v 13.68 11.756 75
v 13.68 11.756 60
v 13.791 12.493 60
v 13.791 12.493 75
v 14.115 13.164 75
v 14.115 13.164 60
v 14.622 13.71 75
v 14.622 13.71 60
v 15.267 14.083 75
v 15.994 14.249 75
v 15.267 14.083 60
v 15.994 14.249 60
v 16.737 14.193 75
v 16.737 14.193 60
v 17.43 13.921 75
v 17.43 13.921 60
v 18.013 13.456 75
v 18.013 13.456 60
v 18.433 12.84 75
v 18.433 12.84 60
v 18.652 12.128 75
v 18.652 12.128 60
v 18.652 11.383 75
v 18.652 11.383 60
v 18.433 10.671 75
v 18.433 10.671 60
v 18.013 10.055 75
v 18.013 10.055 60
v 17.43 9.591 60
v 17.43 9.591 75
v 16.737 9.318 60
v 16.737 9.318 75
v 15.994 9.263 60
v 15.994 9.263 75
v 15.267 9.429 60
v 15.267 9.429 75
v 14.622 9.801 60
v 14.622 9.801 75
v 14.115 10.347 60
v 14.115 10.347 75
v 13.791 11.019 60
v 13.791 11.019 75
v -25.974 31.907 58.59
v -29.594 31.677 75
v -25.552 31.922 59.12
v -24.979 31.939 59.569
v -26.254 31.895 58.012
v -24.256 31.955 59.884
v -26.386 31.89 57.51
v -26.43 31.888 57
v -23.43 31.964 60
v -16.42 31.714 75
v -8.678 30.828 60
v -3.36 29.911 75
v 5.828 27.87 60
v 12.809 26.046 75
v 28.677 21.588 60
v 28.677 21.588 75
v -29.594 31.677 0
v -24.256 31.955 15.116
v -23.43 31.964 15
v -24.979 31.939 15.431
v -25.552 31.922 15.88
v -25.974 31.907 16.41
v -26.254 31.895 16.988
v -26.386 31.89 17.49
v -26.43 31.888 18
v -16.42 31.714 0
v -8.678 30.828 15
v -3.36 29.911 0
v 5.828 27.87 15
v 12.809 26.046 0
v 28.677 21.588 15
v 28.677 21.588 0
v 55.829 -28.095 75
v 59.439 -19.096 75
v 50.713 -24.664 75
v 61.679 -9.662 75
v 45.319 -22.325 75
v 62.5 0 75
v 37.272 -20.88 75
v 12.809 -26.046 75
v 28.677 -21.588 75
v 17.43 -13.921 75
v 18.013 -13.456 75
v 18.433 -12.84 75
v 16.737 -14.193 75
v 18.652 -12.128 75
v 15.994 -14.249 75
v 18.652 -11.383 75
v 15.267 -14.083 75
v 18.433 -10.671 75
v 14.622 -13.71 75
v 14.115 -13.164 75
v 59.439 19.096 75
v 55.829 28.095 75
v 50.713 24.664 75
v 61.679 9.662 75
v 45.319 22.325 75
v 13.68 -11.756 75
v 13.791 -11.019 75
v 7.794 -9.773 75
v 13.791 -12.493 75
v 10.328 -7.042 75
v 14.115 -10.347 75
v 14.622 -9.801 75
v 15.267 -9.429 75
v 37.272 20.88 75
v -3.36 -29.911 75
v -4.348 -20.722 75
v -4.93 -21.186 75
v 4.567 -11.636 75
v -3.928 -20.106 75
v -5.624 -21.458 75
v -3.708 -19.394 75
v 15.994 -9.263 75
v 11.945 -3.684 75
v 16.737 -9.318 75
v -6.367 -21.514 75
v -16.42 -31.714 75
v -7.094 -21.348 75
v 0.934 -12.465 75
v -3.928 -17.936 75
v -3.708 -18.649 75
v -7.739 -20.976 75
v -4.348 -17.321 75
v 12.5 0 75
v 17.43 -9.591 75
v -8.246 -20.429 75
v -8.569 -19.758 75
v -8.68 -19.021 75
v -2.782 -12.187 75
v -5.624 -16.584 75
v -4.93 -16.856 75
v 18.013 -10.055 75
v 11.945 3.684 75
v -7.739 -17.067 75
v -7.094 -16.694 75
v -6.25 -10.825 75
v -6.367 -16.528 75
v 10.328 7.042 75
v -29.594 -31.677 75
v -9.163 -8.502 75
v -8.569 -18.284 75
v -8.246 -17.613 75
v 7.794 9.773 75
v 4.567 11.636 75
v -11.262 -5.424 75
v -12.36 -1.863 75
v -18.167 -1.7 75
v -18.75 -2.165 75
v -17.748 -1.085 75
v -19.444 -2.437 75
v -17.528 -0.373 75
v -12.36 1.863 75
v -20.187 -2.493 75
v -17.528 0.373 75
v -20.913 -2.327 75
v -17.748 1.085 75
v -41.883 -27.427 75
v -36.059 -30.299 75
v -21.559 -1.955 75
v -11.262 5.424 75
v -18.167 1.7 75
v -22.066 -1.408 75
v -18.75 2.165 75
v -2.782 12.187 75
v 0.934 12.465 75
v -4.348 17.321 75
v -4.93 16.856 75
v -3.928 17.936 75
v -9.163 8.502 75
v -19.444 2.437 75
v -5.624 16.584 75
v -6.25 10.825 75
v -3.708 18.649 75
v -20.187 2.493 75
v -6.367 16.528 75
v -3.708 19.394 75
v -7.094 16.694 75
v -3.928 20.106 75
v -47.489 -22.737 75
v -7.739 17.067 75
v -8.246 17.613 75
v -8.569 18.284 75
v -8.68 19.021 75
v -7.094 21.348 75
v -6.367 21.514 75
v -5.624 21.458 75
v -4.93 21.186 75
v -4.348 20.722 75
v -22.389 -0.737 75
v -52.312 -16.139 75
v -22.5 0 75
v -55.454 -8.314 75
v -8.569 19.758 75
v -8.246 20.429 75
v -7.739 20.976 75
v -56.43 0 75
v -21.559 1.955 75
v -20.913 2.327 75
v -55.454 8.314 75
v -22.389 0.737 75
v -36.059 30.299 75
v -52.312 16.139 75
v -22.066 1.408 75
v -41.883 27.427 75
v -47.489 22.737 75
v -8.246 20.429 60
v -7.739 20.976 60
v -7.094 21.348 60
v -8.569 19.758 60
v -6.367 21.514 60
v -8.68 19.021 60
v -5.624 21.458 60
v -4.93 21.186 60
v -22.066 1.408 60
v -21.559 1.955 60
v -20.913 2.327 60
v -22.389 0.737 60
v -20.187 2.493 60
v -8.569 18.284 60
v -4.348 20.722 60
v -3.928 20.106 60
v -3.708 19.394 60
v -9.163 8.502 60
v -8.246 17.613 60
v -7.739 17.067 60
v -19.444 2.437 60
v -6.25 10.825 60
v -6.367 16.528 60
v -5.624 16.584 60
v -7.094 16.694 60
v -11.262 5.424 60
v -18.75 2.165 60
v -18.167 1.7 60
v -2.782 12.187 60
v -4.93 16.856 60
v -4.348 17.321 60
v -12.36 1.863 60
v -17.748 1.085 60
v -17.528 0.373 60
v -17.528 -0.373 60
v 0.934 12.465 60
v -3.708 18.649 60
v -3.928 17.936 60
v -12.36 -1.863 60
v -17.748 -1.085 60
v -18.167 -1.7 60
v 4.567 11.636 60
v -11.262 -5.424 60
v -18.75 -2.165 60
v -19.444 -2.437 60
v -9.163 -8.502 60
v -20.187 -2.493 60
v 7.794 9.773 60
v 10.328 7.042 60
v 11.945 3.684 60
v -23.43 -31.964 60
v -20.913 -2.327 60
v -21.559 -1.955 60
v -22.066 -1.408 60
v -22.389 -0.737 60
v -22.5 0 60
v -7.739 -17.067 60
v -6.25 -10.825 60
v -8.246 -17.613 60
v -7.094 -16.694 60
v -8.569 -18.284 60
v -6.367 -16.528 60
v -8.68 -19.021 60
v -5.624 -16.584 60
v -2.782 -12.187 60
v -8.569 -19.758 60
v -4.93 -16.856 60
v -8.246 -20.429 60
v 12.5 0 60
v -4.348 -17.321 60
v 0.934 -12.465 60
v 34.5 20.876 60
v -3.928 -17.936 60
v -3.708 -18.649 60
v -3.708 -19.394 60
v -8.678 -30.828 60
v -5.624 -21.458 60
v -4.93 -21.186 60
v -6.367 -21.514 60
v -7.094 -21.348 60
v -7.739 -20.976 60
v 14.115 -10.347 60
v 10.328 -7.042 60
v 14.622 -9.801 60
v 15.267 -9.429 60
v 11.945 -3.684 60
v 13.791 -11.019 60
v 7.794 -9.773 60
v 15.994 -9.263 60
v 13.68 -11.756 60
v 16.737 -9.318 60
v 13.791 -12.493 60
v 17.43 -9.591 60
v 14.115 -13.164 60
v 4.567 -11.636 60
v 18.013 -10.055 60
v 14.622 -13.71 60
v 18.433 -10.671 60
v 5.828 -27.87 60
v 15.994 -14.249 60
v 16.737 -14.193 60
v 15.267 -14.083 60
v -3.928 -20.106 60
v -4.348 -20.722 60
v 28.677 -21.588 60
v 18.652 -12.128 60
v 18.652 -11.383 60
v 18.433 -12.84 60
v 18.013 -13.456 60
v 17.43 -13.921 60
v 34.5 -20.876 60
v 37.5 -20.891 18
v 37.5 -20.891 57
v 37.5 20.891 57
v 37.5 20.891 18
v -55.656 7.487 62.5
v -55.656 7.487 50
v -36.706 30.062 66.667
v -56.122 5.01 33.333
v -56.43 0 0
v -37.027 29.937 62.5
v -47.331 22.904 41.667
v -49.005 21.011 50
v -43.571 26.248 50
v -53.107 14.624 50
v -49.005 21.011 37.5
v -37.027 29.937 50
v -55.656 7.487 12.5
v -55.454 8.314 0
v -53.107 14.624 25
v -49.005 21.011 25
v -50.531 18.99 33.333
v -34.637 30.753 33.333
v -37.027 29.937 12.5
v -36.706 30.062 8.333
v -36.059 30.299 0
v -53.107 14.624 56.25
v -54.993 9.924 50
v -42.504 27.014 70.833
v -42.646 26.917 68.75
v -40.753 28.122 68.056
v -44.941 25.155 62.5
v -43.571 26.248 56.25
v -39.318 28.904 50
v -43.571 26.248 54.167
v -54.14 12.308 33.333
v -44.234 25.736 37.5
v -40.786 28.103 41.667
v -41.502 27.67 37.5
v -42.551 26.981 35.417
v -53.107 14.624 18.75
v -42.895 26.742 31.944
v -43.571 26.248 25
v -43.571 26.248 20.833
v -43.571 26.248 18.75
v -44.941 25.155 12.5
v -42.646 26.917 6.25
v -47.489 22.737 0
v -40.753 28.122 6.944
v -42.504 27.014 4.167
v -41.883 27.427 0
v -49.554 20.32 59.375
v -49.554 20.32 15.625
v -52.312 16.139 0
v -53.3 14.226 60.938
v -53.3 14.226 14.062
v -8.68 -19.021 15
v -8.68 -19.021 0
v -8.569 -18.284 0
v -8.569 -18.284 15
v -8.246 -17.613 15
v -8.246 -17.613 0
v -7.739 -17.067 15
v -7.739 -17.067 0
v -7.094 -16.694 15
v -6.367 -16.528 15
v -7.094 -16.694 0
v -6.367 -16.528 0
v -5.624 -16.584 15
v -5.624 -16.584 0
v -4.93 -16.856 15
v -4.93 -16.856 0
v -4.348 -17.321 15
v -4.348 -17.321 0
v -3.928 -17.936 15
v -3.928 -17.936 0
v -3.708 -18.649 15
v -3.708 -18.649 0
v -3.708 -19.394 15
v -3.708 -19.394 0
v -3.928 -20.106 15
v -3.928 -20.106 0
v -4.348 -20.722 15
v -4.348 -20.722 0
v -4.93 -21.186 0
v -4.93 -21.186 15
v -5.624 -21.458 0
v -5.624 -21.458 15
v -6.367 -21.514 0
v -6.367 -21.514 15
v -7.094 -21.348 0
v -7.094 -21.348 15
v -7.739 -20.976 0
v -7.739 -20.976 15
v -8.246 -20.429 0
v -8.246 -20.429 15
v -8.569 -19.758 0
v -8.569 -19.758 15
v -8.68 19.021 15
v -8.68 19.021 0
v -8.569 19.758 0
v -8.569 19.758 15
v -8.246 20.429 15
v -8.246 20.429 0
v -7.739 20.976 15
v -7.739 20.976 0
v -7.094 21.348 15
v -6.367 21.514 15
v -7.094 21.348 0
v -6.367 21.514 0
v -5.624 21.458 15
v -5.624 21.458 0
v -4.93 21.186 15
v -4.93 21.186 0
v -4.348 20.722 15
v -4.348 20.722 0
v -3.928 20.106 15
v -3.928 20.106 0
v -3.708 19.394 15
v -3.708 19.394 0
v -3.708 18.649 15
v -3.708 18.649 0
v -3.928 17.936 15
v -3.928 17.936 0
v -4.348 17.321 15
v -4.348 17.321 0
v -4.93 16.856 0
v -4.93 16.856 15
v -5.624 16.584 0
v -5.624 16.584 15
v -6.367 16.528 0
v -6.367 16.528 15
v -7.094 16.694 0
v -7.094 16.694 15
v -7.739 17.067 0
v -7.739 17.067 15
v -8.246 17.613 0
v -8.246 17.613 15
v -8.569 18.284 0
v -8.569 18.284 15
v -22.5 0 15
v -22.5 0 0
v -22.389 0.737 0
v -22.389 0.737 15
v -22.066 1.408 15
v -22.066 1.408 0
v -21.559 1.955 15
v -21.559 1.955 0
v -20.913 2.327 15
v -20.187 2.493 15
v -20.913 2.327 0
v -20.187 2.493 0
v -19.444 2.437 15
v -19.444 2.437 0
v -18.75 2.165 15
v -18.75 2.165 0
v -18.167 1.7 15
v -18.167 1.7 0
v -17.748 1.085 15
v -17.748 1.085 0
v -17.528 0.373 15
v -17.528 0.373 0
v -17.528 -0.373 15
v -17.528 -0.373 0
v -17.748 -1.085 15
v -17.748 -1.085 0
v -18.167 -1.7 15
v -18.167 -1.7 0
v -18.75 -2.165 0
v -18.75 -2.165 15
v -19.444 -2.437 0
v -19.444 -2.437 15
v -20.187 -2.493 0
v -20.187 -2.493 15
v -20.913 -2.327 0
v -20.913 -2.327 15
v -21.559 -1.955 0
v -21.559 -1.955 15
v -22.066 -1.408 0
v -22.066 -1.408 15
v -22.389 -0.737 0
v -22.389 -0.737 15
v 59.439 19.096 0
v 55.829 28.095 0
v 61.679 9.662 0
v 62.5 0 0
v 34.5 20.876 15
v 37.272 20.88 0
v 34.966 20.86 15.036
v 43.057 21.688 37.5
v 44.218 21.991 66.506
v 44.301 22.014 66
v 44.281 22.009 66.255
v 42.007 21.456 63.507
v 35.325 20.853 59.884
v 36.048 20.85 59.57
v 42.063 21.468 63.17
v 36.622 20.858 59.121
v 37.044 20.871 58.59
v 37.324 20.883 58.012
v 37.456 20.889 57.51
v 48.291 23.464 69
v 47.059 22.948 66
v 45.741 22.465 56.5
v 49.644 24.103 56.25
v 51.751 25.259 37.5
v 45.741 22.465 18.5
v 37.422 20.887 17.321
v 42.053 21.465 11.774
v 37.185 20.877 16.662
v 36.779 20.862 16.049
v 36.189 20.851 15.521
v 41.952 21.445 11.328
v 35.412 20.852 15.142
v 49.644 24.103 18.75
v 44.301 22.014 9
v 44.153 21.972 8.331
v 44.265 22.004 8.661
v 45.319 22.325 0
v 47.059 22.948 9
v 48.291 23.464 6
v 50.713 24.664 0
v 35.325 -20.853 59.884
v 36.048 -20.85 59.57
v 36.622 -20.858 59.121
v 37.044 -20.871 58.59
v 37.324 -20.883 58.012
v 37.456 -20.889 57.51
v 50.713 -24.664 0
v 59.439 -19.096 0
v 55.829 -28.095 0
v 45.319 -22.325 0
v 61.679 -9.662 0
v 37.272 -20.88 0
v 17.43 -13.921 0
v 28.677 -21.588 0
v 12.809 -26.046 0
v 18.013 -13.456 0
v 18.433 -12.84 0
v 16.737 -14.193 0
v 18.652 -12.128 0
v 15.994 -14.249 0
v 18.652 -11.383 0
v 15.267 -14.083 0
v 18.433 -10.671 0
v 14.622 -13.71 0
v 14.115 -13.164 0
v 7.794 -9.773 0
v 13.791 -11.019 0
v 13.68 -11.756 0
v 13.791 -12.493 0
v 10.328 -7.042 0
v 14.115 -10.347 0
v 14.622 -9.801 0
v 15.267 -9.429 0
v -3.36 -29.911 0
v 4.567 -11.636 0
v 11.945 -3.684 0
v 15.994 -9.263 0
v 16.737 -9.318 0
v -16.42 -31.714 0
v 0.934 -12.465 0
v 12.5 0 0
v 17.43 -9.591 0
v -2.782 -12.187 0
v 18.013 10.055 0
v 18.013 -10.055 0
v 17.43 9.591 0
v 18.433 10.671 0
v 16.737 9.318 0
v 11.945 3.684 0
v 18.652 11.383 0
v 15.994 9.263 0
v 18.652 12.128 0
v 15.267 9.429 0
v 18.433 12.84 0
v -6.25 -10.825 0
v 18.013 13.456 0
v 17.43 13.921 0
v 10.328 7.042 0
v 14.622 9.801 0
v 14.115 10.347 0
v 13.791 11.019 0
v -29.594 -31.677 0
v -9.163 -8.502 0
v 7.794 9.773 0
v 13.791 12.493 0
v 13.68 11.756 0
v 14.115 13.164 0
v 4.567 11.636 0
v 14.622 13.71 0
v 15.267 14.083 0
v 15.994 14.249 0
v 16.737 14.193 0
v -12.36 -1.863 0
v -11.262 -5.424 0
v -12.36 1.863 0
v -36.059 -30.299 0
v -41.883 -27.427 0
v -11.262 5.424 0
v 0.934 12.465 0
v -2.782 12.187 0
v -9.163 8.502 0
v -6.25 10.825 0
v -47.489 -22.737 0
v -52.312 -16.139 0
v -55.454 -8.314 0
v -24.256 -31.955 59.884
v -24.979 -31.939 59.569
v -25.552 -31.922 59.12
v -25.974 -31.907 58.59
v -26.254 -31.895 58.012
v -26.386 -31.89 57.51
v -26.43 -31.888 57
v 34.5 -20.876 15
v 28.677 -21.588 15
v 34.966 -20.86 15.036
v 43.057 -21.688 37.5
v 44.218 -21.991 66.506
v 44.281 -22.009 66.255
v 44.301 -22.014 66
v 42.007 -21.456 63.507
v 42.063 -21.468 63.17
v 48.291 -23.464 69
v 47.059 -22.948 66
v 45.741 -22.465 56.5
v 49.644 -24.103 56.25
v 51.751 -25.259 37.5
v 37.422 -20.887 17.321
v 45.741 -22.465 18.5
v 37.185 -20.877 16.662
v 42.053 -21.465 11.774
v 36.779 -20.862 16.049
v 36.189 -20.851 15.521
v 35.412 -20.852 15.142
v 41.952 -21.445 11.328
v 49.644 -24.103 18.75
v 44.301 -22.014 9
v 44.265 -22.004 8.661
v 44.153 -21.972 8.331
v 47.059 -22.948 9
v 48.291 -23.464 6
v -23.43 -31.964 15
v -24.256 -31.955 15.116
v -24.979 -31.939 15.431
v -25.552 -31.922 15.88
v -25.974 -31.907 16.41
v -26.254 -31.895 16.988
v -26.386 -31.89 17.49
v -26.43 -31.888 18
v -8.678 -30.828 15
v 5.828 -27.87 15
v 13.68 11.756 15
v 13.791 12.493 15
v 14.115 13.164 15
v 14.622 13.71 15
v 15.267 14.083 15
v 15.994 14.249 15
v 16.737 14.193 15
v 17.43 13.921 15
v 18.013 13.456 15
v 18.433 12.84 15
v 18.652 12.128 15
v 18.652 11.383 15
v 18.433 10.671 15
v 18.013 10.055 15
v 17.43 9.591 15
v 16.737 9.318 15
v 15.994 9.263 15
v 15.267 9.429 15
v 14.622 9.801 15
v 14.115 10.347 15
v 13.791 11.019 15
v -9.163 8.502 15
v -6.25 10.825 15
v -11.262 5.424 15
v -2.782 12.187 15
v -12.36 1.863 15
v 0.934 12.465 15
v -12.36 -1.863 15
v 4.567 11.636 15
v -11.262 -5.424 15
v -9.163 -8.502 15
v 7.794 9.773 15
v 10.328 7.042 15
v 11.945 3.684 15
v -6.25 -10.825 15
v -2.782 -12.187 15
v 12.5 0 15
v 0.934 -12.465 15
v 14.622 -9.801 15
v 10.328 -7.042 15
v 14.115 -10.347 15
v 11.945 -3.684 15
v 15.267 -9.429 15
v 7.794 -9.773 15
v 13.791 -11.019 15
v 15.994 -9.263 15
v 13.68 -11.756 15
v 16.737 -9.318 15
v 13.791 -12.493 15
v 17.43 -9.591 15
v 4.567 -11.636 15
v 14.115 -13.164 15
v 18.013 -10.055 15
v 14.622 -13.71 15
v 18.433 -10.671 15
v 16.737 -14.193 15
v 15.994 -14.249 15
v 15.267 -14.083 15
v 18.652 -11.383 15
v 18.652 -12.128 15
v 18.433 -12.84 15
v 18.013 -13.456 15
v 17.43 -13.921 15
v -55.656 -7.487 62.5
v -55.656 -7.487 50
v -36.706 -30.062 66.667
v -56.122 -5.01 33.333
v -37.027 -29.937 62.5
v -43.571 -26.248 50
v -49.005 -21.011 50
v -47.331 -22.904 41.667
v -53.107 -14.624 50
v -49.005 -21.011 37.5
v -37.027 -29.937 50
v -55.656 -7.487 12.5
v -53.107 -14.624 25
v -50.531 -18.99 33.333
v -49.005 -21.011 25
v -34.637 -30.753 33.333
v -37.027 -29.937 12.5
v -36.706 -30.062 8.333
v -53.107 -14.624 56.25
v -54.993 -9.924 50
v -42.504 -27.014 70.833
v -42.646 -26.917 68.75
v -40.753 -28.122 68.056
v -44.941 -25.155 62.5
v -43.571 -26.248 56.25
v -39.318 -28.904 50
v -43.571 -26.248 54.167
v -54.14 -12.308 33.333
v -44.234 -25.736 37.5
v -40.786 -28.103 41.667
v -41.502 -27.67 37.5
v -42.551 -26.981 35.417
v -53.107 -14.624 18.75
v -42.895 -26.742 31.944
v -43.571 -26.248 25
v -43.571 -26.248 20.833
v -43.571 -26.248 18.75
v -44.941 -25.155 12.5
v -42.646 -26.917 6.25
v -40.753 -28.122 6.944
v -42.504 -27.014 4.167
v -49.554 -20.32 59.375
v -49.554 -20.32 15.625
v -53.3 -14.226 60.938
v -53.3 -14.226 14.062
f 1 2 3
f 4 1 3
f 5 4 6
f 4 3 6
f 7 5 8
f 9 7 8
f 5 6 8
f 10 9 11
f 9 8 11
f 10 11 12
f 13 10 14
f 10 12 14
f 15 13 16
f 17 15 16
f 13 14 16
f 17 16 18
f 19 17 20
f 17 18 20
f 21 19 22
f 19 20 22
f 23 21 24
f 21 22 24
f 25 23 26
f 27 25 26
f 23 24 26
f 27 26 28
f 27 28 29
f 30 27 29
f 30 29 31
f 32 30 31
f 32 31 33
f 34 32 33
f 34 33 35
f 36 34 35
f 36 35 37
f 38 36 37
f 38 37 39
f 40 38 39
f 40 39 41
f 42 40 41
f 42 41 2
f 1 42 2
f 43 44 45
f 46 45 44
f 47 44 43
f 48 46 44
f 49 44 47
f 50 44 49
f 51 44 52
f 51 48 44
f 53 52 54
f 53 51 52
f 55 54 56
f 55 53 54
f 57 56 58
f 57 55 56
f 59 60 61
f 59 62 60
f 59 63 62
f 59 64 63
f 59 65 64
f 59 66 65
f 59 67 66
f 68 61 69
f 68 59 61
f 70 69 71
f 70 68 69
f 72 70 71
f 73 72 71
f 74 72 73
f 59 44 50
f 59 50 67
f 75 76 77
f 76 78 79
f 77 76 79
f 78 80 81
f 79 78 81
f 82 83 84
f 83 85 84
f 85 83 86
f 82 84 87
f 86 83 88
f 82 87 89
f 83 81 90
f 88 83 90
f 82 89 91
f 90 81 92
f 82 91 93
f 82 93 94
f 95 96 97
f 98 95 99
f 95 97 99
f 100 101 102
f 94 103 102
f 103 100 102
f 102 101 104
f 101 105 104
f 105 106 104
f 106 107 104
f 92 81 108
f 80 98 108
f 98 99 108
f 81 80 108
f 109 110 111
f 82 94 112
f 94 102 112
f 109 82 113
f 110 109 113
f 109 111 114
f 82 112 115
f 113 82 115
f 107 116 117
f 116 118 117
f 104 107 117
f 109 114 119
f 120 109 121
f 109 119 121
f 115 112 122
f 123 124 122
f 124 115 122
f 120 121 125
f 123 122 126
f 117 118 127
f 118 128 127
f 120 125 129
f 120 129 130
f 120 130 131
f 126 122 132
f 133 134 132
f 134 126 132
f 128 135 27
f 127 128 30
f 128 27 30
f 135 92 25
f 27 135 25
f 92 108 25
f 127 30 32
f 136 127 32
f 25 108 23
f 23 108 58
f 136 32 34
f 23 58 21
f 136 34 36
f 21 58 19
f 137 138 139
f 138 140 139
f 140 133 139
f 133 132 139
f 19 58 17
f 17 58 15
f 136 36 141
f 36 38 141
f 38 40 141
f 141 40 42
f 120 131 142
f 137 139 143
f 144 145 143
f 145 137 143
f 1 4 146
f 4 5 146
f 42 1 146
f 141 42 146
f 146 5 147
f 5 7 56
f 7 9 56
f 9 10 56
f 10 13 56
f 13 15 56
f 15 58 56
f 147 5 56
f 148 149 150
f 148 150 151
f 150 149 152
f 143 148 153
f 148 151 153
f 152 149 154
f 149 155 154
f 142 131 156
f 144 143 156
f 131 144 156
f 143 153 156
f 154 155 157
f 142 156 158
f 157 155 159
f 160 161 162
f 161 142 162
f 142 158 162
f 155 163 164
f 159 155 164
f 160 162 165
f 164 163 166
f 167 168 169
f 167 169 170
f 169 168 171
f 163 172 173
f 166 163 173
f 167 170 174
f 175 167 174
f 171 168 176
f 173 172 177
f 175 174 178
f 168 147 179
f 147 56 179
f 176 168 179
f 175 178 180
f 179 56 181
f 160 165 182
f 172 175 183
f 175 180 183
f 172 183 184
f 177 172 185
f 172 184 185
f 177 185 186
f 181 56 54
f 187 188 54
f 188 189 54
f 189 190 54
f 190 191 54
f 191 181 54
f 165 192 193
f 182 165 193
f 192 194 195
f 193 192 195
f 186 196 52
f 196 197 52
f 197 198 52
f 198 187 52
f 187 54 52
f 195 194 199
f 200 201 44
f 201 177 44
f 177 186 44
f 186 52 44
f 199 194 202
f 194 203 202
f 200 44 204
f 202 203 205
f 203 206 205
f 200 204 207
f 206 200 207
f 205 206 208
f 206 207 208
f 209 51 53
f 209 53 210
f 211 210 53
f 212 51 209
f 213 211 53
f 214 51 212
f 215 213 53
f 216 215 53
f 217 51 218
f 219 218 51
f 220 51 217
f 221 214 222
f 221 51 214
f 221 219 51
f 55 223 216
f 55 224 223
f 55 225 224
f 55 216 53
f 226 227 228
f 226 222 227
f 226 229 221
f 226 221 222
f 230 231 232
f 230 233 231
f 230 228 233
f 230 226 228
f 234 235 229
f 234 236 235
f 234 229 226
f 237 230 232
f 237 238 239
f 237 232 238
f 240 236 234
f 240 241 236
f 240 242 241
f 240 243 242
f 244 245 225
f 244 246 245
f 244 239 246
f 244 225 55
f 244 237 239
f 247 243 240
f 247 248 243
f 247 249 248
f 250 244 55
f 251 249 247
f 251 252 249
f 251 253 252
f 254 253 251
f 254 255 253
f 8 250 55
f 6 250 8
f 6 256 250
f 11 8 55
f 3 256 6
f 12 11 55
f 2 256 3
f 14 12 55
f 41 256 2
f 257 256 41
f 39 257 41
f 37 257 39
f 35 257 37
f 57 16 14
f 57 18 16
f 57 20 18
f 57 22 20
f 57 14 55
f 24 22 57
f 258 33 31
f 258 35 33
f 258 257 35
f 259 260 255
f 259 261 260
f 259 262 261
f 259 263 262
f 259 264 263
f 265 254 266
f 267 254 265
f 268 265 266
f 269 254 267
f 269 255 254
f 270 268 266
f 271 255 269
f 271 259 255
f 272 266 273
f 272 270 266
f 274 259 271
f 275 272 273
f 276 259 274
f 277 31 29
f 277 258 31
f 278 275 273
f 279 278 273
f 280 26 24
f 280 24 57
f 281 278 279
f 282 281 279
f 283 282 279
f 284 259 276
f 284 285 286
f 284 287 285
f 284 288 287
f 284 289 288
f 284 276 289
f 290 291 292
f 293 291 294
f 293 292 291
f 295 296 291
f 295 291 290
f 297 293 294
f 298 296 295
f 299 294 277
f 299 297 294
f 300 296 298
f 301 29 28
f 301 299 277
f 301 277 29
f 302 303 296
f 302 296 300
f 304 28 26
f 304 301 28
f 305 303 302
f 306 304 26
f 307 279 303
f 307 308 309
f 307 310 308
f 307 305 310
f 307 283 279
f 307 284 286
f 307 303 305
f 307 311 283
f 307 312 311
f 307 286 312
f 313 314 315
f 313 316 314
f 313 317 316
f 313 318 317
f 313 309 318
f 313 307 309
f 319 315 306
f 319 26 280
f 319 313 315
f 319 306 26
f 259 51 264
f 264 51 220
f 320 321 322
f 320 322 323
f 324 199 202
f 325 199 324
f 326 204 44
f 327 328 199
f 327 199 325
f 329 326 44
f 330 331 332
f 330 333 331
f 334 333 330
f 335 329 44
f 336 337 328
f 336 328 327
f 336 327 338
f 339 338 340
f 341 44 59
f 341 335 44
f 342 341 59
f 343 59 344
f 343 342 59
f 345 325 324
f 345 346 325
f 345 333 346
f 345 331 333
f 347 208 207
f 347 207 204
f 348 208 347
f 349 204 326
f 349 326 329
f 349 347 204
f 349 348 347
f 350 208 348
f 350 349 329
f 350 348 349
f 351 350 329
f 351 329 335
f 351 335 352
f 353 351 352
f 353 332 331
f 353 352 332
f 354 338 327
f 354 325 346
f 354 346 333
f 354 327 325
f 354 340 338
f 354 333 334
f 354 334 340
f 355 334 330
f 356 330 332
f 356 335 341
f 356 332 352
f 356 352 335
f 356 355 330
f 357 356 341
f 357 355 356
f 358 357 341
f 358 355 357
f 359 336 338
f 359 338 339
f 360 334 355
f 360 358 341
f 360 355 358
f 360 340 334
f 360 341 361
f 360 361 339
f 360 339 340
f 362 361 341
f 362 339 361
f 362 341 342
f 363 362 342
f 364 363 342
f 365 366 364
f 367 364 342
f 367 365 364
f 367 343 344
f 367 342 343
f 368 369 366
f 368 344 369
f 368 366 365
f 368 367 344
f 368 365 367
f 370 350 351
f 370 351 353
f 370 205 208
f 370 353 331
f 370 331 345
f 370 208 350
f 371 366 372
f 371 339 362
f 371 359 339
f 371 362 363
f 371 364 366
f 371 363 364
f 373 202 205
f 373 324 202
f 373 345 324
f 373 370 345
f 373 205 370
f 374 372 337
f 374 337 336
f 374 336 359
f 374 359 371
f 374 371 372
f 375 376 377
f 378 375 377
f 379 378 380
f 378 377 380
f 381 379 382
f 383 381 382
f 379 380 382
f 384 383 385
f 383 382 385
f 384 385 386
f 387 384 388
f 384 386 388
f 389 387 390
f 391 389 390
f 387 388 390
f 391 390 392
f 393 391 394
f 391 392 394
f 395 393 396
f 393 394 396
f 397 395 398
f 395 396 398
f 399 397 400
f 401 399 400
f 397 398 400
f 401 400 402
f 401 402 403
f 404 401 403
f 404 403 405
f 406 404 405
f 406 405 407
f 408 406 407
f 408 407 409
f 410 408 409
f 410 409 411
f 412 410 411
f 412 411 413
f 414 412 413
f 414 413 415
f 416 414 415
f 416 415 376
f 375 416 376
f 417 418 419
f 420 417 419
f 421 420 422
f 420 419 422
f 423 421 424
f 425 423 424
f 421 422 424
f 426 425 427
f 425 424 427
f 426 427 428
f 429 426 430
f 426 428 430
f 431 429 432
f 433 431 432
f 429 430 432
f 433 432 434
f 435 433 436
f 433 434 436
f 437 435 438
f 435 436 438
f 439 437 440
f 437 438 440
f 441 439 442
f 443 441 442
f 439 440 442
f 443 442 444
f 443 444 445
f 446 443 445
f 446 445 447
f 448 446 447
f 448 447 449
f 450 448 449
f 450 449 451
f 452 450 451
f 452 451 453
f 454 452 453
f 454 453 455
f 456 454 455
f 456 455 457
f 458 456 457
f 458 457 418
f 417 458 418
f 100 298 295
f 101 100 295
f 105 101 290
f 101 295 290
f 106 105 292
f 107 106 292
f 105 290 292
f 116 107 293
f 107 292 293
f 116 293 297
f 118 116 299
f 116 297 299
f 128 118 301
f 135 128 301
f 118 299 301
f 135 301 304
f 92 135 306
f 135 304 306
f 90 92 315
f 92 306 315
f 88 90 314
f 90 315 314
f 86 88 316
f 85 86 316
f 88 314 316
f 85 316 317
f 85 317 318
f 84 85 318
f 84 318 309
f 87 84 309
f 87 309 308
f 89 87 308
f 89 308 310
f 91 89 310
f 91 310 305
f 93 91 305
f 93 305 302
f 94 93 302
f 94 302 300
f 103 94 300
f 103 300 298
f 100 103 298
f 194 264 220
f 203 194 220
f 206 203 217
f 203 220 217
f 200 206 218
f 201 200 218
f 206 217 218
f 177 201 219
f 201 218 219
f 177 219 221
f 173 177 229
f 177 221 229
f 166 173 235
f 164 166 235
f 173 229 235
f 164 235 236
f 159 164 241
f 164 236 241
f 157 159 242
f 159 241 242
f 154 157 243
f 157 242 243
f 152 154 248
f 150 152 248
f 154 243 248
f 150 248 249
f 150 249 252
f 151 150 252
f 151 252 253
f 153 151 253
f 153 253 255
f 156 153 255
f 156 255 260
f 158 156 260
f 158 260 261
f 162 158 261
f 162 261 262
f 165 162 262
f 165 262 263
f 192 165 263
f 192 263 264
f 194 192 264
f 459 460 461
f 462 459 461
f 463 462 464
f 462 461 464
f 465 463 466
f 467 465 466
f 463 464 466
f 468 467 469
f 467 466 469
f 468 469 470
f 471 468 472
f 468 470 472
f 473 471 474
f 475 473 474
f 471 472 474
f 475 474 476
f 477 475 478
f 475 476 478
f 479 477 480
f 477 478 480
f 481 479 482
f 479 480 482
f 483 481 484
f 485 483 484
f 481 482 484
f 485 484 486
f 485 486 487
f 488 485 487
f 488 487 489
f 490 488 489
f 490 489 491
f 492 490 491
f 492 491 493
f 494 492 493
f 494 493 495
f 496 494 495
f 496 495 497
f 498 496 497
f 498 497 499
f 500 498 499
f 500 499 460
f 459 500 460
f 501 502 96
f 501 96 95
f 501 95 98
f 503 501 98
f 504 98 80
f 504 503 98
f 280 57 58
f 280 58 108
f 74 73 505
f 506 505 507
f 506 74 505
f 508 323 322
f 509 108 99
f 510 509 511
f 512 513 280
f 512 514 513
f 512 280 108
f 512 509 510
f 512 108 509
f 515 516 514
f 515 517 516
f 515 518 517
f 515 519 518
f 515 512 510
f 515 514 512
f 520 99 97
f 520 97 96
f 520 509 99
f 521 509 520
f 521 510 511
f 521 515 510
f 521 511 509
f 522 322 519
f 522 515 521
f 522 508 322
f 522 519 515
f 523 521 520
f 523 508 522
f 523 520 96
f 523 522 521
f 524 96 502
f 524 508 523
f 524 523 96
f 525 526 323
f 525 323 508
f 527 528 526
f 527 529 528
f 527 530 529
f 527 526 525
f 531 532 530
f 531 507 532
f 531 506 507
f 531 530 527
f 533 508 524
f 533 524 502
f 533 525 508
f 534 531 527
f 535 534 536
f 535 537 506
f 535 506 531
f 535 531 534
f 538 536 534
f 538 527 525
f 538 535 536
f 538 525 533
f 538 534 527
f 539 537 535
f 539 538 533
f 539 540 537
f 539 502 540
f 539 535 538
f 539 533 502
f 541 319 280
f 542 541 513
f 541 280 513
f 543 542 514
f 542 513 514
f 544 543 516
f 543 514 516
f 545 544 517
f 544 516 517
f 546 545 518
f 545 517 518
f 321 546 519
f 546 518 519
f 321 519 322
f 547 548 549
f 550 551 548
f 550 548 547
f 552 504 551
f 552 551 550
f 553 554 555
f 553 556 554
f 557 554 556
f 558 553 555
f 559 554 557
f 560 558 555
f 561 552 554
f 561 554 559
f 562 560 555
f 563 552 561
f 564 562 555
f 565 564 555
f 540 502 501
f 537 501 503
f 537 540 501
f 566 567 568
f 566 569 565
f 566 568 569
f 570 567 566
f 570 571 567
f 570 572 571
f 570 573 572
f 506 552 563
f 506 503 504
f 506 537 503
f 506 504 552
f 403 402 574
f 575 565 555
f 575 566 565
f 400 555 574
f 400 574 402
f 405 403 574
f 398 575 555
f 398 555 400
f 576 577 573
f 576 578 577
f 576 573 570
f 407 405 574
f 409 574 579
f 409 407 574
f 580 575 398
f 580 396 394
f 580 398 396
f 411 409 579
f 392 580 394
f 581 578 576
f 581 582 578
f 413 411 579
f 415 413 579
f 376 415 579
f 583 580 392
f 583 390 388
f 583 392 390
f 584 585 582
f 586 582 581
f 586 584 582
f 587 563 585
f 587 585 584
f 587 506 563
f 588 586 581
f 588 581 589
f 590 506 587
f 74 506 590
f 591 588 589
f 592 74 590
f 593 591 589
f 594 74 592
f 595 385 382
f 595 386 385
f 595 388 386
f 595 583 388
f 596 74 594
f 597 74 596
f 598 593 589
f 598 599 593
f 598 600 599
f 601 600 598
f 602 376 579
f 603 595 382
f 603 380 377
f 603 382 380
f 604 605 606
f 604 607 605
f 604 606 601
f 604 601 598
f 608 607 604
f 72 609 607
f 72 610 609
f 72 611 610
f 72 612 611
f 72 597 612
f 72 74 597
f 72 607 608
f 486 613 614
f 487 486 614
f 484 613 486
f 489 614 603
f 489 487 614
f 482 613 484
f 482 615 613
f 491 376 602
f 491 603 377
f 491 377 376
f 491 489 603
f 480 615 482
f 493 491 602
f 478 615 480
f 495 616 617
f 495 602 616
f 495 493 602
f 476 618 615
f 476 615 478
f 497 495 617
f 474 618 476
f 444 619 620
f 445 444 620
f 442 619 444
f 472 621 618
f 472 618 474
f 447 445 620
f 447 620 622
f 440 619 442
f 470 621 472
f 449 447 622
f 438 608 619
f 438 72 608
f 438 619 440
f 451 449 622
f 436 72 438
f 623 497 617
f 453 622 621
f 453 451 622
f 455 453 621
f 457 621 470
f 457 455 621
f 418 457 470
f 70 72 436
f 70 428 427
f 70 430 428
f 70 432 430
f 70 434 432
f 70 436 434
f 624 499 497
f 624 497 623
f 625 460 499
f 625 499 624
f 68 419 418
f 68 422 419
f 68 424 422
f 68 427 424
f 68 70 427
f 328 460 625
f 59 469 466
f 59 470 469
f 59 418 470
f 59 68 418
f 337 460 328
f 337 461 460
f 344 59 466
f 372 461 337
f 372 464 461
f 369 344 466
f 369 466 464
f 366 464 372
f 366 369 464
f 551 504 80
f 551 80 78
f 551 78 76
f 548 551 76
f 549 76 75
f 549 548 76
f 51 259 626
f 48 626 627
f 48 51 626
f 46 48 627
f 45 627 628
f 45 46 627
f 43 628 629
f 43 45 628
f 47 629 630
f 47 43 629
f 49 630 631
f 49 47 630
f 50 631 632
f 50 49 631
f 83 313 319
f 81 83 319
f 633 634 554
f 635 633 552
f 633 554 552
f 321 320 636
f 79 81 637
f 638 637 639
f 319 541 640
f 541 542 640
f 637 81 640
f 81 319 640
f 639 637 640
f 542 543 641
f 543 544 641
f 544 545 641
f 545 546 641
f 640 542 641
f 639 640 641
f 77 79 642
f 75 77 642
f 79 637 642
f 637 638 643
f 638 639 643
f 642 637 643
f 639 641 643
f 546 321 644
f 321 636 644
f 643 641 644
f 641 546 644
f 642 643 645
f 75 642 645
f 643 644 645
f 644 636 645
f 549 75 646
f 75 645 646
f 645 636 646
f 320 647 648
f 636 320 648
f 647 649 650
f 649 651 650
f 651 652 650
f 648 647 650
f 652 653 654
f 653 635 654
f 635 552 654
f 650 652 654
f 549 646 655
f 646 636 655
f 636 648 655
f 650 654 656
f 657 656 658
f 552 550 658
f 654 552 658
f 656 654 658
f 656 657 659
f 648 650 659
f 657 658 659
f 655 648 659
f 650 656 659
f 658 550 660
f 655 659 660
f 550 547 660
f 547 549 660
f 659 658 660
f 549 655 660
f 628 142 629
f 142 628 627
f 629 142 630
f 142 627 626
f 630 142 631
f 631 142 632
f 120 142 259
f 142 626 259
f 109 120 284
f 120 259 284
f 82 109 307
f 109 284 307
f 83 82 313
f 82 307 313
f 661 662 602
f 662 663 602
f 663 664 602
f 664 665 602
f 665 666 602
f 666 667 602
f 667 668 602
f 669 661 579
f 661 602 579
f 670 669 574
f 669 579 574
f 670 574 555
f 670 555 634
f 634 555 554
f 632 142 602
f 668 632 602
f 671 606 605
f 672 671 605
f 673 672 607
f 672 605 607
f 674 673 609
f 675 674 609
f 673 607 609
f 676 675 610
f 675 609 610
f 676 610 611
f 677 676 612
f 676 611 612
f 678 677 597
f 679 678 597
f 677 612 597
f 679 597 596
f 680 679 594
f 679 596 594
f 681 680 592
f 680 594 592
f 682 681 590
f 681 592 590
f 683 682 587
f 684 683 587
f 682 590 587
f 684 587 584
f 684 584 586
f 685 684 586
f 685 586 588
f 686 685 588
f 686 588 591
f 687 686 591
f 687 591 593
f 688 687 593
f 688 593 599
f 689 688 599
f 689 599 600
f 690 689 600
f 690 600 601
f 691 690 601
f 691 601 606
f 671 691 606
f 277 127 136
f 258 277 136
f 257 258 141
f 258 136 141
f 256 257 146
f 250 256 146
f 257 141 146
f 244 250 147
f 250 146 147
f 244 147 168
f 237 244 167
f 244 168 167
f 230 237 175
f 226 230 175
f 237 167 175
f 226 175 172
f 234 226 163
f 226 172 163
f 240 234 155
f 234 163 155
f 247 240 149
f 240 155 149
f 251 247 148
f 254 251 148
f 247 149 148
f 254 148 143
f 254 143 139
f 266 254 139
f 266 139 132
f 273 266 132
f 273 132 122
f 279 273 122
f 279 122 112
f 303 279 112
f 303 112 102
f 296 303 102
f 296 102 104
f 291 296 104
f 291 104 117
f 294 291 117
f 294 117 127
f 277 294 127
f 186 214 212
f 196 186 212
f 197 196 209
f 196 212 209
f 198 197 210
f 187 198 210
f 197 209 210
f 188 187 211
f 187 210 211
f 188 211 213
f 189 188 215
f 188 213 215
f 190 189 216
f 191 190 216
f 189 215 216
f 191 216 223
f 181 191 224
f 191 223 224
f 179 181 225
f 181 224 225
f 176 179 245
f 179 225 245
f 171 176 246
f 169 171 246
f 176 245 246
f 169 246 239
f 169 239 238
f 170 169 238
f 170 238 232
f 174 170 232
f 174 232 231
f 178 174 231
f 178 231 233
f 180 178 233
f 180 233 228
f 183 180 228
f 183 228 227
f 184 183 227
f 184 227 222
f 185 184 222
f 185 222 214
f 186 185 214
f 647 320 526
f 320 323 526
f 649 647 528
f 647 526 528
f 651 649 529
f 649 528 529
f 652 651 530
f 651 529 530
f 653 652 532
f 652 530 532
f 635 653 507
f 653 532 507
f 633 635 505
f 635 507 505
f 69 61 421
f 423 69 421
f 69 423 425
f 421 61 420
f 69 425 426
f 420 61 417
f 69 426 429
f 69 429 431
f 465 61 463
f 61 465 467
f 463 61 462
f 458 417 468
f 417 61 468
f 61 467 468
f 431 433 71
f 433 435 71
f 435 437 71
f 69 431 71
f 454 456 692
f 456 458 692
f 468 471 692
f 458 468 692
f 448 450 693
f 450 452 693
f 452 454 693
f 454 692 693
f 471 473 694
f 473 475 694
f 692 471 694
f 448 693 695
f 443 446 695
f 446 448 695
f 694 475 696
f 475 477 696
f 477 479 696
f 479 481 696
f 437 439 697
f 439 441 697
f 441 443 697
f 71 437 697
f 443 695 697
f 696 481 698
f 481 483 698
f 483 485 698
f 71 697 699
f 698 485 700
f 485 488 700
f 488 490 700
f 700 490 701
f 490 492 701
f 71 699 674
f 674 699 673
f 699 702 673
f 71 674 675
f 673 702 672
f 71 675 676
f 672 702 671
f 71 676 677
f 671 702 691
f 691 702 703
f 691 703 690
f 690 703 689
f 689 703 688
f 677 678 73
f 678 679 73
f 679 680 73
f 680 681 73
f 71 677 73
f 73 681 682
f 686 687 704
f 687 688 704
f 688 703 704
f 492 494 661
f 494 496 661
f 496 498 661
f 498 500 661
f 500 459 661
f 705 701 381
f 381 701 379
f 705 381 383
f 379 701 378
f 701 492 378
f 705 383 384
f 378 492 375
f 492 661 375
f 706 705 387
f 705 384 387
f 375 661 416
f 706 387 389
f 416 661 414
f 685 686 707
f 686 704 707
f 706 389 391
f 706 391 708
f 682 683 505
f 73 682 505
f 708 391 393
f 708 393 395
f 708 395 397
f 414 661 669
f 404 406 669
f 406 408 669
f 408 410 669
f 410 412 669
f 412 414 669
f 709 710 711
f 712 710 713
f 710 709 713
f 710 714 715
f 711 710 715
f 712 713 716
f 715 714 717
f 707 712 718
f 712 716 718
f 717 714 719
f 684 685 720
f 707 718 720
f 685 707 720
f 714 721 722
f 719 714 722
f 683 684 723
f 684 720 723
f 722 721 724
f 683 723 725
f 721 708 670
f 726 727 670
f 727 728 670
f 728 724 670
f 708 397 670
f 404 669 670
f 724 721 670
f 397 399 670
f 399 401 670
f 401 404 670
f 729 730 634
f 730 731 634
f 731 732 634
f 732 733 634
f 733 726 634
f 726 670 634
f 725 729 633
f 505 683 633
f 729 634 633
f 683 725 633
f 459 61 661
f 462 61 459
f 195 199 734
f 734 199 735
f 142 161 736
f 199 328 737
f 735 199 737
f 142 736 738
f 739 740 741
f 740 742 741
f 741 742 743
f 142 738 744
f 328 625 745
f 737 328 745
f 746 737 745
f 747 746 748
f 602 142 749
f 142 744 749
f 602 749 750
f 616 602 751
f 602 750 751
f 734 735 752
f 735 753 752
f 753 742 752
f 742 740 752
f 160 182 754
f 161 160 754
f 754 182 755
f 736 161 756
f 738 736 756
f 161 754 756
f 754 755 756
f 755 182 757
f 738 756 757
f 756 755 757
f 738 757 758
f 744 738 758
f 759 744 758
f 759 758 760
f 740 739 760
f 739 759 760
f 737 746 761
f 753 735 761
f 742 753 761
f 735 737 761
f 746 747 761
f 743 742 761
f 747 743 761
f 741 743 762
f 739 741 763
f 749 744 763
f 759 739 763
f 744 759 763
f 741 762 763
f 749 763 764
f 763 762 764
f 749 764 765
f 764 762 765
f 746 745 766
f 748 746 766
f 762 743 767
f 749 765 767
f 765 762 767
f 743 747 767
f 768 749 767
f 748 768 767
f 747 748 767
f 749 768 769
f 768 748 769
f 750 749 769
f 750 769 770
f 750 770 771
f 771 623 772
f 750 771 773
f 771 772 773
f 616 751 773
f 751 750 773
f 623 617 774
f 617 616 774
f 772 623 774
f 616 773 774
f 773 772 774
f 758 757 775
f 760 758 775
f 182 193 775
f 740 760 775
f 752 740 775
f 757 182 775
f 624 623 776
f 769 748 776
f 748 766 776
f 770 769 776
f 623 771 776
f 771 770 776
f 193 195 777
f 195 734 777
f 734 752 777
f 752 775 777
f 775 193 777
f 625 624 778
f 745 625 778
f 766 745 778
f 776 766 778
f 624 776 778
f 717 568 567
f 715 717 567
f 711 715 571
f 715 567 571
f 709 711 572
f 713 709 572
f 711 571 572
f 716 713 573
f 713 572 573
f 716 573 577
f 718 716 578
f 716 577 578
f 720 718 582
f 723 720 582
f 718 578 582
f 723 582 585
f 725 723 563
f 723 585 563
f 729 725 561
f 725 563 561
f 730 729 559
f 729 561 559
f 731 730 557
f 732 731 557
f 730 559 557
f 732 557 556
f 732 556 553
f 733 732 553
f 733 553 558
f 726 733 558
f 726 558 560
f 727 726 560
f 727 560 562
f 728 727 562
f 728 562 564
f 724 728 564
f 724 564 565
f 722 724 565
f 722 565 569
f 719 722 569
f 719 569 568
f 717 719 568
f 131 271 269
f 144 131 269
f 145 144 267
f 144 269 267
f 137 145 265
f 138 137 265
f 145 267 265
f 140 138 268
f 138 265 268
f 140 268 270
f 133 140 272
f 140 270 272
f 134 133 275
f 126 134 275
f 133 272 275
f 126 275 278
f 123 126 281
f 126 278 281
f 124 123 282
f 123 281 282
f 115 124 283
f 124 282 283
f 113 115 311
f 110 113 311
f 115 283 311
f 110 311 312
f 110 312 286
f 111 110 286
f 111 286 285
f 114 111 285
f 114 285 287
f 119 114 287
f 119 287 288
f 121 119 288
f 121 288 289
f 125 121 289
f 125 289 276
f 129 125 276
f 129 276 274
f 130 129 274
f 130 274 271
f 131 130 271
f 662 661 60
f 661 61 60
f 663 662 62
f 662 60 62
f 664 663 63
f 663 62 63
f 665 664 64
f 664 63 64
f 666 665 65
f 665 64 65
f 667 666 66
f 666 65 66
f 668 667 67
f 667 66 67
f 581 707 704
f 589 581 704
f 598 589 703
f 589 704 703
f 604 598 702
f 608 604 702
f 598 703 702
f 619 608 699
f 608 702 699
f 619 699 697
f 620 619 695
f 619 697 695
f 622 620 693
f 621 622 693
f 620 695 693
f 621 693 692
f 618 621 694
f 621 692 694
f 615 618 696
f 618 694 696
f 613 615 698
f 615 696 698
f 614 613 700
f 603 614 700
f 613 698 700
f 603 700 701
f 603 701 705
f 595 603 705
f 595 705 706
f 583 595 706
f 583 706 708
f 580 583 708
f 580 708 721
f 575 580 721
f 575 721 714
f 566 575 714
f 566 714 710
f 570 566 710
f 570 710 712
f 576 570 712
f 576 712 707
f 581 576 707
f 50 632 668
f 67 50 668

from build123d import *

# Parameters (mm, degrees)
RESSALTO_EXTRUS_O1_DEPTH                = 75
CORTE_EXTRUS_O1_DEPTH                   = 70
CORTE_EXTRUS_O1_DEPTH_BACK              = 70
ESBO_O2_W                               = 63.930126489
ESBO_O2_H                               = 45
ESBO_O3_R                               = 12.5
CORTE_EXTRUS_O2_DEPTH                   = 103.728030149
FILETE1_R                               = 3
BROCA_DE_ROSQUEAR_PARA_TARRAXA_DE_M61_D = 5


with BuildPart() as part:
    # Esboço1 → Ressalto-extrusão1 (new body)
    with BuildSketch(Plane.XY):
        with BuildLine():
            ThreePointArc((55.829329515, 28.095123526), (60.733716713, 14.420104299), (62.5, 0))
            ThreePointArc((62.5, 0), (60.733716713, -14.420104299), (55.829329515, -28.095123526))
            add(Edge.make_bspline(
                [(28.676911595, -21.588340477), (43.861491247, -18.534041768), (55.829329515, -28.095123526)],
                knots=[0, 0, 0, 1, 1, 1], degree=2))
            add(Edge.make_bspline(
                [(-29.594432007, -31.676619774), (-9.724198858, -33.439461038), (9.873119669, -26.770904045), (28.676911595, -21.588340477)],
                knots=[0, 0, 0, 0, 1, 1, 1, 1], degree=3))
            add(Edge.make_bspline(
                [(-56.430126489, 0), (-56.804873179, -15.057396007), (-45.200173771, -30.412276657), (-29.594432007, -31.676619774)],
                knots=[0, 0, 0, 0, 1, 1, 1, 1], degree=3))
            add(Edge.make_bspline(
                [(-56.430126489, 0), (-56.804873179, 15.057396007), (-45.200173771, 30.412276657), (-29.594432007, 31.676619774)],
                knots=[0, 0, 0, 0, 1, 1, 1, 1], degree=3))
            add(Edge.make_bspline(
                [(-29.594432007, 31.676619774), (-9.724198858, 33.439461038), (9.873119669, 26.770904045), (28.676911595, 21.588340477)],
                knots=[0, 0, 0, 0, 1, 1, 1, 1], degree=3))
            add(Edge.make_bspline(
                [(28.676911595, 21.588340477), (43.861491247, 18.534041768), (55.829329515, 28.095123526)],
                knots=[0, 0, 0, 1, 1, 1], degree=2))
        make_face()
    extrude(amount=RESSALTO_EXTRUS_O1_DEPTH)

    # Esboço2 → Corte-extrusão1 (cut, two sides: drawn at the far end of the back side and taken through both)
    with BuildSketch(Plane(origin=(0, 0, 0), x_dir=(1, 0, 0), z_dir=(0, 1, 0)).offset(-CORTE_EXTRUS_O1_DEPTH_BACK)):
        with Locations((5.534936755, -37.5)):
            Rectangle(ESBO_O2_W, ESBO_O2_H)
    extrude(amount=CORTE_EXTRUS_O1_DEPTH + CORTE_EXTRUS_O1_DEPTH_BACK, mode=Mode.SUBTRACT)

    # Esboço3 → Corte-extrusão2 (cut, through all)
    with BuildSketch(Plane.XY.offset(75)):
        Circle(ESBO_O3_R)
    extrude(amount=-CORTE_EXTRUS_O2_DEPTH, mode=Mode.SUBTRACT)

    # Filete1
    filete1_edges = [part.edges().sort_by_distance(p)[0] for p in [
        (37.5, 0, 60),
        (37.5, 0, 15),
        (-26.430126489, 0, 60),
        (-26.430126489, 0, 15),
    ]]
    fillet(filete1_edges, radius=FILETE1_R)

    # Broca de rosquear para tarraxa de M61 (through all)
    with Locations(Plane.XY.offset(75)):
        with Locations((-6.180339887, 19.021130326), (16.180339887, 11.755705046), (16.180339888, -11.755705046), (-6.180339887, -19.021130326), (-20, 0)):
            Hole(BROCA_DE_ROSQUEAR_PARA_TARRAXA_DE_M61_D / 2)


solid = part.part
